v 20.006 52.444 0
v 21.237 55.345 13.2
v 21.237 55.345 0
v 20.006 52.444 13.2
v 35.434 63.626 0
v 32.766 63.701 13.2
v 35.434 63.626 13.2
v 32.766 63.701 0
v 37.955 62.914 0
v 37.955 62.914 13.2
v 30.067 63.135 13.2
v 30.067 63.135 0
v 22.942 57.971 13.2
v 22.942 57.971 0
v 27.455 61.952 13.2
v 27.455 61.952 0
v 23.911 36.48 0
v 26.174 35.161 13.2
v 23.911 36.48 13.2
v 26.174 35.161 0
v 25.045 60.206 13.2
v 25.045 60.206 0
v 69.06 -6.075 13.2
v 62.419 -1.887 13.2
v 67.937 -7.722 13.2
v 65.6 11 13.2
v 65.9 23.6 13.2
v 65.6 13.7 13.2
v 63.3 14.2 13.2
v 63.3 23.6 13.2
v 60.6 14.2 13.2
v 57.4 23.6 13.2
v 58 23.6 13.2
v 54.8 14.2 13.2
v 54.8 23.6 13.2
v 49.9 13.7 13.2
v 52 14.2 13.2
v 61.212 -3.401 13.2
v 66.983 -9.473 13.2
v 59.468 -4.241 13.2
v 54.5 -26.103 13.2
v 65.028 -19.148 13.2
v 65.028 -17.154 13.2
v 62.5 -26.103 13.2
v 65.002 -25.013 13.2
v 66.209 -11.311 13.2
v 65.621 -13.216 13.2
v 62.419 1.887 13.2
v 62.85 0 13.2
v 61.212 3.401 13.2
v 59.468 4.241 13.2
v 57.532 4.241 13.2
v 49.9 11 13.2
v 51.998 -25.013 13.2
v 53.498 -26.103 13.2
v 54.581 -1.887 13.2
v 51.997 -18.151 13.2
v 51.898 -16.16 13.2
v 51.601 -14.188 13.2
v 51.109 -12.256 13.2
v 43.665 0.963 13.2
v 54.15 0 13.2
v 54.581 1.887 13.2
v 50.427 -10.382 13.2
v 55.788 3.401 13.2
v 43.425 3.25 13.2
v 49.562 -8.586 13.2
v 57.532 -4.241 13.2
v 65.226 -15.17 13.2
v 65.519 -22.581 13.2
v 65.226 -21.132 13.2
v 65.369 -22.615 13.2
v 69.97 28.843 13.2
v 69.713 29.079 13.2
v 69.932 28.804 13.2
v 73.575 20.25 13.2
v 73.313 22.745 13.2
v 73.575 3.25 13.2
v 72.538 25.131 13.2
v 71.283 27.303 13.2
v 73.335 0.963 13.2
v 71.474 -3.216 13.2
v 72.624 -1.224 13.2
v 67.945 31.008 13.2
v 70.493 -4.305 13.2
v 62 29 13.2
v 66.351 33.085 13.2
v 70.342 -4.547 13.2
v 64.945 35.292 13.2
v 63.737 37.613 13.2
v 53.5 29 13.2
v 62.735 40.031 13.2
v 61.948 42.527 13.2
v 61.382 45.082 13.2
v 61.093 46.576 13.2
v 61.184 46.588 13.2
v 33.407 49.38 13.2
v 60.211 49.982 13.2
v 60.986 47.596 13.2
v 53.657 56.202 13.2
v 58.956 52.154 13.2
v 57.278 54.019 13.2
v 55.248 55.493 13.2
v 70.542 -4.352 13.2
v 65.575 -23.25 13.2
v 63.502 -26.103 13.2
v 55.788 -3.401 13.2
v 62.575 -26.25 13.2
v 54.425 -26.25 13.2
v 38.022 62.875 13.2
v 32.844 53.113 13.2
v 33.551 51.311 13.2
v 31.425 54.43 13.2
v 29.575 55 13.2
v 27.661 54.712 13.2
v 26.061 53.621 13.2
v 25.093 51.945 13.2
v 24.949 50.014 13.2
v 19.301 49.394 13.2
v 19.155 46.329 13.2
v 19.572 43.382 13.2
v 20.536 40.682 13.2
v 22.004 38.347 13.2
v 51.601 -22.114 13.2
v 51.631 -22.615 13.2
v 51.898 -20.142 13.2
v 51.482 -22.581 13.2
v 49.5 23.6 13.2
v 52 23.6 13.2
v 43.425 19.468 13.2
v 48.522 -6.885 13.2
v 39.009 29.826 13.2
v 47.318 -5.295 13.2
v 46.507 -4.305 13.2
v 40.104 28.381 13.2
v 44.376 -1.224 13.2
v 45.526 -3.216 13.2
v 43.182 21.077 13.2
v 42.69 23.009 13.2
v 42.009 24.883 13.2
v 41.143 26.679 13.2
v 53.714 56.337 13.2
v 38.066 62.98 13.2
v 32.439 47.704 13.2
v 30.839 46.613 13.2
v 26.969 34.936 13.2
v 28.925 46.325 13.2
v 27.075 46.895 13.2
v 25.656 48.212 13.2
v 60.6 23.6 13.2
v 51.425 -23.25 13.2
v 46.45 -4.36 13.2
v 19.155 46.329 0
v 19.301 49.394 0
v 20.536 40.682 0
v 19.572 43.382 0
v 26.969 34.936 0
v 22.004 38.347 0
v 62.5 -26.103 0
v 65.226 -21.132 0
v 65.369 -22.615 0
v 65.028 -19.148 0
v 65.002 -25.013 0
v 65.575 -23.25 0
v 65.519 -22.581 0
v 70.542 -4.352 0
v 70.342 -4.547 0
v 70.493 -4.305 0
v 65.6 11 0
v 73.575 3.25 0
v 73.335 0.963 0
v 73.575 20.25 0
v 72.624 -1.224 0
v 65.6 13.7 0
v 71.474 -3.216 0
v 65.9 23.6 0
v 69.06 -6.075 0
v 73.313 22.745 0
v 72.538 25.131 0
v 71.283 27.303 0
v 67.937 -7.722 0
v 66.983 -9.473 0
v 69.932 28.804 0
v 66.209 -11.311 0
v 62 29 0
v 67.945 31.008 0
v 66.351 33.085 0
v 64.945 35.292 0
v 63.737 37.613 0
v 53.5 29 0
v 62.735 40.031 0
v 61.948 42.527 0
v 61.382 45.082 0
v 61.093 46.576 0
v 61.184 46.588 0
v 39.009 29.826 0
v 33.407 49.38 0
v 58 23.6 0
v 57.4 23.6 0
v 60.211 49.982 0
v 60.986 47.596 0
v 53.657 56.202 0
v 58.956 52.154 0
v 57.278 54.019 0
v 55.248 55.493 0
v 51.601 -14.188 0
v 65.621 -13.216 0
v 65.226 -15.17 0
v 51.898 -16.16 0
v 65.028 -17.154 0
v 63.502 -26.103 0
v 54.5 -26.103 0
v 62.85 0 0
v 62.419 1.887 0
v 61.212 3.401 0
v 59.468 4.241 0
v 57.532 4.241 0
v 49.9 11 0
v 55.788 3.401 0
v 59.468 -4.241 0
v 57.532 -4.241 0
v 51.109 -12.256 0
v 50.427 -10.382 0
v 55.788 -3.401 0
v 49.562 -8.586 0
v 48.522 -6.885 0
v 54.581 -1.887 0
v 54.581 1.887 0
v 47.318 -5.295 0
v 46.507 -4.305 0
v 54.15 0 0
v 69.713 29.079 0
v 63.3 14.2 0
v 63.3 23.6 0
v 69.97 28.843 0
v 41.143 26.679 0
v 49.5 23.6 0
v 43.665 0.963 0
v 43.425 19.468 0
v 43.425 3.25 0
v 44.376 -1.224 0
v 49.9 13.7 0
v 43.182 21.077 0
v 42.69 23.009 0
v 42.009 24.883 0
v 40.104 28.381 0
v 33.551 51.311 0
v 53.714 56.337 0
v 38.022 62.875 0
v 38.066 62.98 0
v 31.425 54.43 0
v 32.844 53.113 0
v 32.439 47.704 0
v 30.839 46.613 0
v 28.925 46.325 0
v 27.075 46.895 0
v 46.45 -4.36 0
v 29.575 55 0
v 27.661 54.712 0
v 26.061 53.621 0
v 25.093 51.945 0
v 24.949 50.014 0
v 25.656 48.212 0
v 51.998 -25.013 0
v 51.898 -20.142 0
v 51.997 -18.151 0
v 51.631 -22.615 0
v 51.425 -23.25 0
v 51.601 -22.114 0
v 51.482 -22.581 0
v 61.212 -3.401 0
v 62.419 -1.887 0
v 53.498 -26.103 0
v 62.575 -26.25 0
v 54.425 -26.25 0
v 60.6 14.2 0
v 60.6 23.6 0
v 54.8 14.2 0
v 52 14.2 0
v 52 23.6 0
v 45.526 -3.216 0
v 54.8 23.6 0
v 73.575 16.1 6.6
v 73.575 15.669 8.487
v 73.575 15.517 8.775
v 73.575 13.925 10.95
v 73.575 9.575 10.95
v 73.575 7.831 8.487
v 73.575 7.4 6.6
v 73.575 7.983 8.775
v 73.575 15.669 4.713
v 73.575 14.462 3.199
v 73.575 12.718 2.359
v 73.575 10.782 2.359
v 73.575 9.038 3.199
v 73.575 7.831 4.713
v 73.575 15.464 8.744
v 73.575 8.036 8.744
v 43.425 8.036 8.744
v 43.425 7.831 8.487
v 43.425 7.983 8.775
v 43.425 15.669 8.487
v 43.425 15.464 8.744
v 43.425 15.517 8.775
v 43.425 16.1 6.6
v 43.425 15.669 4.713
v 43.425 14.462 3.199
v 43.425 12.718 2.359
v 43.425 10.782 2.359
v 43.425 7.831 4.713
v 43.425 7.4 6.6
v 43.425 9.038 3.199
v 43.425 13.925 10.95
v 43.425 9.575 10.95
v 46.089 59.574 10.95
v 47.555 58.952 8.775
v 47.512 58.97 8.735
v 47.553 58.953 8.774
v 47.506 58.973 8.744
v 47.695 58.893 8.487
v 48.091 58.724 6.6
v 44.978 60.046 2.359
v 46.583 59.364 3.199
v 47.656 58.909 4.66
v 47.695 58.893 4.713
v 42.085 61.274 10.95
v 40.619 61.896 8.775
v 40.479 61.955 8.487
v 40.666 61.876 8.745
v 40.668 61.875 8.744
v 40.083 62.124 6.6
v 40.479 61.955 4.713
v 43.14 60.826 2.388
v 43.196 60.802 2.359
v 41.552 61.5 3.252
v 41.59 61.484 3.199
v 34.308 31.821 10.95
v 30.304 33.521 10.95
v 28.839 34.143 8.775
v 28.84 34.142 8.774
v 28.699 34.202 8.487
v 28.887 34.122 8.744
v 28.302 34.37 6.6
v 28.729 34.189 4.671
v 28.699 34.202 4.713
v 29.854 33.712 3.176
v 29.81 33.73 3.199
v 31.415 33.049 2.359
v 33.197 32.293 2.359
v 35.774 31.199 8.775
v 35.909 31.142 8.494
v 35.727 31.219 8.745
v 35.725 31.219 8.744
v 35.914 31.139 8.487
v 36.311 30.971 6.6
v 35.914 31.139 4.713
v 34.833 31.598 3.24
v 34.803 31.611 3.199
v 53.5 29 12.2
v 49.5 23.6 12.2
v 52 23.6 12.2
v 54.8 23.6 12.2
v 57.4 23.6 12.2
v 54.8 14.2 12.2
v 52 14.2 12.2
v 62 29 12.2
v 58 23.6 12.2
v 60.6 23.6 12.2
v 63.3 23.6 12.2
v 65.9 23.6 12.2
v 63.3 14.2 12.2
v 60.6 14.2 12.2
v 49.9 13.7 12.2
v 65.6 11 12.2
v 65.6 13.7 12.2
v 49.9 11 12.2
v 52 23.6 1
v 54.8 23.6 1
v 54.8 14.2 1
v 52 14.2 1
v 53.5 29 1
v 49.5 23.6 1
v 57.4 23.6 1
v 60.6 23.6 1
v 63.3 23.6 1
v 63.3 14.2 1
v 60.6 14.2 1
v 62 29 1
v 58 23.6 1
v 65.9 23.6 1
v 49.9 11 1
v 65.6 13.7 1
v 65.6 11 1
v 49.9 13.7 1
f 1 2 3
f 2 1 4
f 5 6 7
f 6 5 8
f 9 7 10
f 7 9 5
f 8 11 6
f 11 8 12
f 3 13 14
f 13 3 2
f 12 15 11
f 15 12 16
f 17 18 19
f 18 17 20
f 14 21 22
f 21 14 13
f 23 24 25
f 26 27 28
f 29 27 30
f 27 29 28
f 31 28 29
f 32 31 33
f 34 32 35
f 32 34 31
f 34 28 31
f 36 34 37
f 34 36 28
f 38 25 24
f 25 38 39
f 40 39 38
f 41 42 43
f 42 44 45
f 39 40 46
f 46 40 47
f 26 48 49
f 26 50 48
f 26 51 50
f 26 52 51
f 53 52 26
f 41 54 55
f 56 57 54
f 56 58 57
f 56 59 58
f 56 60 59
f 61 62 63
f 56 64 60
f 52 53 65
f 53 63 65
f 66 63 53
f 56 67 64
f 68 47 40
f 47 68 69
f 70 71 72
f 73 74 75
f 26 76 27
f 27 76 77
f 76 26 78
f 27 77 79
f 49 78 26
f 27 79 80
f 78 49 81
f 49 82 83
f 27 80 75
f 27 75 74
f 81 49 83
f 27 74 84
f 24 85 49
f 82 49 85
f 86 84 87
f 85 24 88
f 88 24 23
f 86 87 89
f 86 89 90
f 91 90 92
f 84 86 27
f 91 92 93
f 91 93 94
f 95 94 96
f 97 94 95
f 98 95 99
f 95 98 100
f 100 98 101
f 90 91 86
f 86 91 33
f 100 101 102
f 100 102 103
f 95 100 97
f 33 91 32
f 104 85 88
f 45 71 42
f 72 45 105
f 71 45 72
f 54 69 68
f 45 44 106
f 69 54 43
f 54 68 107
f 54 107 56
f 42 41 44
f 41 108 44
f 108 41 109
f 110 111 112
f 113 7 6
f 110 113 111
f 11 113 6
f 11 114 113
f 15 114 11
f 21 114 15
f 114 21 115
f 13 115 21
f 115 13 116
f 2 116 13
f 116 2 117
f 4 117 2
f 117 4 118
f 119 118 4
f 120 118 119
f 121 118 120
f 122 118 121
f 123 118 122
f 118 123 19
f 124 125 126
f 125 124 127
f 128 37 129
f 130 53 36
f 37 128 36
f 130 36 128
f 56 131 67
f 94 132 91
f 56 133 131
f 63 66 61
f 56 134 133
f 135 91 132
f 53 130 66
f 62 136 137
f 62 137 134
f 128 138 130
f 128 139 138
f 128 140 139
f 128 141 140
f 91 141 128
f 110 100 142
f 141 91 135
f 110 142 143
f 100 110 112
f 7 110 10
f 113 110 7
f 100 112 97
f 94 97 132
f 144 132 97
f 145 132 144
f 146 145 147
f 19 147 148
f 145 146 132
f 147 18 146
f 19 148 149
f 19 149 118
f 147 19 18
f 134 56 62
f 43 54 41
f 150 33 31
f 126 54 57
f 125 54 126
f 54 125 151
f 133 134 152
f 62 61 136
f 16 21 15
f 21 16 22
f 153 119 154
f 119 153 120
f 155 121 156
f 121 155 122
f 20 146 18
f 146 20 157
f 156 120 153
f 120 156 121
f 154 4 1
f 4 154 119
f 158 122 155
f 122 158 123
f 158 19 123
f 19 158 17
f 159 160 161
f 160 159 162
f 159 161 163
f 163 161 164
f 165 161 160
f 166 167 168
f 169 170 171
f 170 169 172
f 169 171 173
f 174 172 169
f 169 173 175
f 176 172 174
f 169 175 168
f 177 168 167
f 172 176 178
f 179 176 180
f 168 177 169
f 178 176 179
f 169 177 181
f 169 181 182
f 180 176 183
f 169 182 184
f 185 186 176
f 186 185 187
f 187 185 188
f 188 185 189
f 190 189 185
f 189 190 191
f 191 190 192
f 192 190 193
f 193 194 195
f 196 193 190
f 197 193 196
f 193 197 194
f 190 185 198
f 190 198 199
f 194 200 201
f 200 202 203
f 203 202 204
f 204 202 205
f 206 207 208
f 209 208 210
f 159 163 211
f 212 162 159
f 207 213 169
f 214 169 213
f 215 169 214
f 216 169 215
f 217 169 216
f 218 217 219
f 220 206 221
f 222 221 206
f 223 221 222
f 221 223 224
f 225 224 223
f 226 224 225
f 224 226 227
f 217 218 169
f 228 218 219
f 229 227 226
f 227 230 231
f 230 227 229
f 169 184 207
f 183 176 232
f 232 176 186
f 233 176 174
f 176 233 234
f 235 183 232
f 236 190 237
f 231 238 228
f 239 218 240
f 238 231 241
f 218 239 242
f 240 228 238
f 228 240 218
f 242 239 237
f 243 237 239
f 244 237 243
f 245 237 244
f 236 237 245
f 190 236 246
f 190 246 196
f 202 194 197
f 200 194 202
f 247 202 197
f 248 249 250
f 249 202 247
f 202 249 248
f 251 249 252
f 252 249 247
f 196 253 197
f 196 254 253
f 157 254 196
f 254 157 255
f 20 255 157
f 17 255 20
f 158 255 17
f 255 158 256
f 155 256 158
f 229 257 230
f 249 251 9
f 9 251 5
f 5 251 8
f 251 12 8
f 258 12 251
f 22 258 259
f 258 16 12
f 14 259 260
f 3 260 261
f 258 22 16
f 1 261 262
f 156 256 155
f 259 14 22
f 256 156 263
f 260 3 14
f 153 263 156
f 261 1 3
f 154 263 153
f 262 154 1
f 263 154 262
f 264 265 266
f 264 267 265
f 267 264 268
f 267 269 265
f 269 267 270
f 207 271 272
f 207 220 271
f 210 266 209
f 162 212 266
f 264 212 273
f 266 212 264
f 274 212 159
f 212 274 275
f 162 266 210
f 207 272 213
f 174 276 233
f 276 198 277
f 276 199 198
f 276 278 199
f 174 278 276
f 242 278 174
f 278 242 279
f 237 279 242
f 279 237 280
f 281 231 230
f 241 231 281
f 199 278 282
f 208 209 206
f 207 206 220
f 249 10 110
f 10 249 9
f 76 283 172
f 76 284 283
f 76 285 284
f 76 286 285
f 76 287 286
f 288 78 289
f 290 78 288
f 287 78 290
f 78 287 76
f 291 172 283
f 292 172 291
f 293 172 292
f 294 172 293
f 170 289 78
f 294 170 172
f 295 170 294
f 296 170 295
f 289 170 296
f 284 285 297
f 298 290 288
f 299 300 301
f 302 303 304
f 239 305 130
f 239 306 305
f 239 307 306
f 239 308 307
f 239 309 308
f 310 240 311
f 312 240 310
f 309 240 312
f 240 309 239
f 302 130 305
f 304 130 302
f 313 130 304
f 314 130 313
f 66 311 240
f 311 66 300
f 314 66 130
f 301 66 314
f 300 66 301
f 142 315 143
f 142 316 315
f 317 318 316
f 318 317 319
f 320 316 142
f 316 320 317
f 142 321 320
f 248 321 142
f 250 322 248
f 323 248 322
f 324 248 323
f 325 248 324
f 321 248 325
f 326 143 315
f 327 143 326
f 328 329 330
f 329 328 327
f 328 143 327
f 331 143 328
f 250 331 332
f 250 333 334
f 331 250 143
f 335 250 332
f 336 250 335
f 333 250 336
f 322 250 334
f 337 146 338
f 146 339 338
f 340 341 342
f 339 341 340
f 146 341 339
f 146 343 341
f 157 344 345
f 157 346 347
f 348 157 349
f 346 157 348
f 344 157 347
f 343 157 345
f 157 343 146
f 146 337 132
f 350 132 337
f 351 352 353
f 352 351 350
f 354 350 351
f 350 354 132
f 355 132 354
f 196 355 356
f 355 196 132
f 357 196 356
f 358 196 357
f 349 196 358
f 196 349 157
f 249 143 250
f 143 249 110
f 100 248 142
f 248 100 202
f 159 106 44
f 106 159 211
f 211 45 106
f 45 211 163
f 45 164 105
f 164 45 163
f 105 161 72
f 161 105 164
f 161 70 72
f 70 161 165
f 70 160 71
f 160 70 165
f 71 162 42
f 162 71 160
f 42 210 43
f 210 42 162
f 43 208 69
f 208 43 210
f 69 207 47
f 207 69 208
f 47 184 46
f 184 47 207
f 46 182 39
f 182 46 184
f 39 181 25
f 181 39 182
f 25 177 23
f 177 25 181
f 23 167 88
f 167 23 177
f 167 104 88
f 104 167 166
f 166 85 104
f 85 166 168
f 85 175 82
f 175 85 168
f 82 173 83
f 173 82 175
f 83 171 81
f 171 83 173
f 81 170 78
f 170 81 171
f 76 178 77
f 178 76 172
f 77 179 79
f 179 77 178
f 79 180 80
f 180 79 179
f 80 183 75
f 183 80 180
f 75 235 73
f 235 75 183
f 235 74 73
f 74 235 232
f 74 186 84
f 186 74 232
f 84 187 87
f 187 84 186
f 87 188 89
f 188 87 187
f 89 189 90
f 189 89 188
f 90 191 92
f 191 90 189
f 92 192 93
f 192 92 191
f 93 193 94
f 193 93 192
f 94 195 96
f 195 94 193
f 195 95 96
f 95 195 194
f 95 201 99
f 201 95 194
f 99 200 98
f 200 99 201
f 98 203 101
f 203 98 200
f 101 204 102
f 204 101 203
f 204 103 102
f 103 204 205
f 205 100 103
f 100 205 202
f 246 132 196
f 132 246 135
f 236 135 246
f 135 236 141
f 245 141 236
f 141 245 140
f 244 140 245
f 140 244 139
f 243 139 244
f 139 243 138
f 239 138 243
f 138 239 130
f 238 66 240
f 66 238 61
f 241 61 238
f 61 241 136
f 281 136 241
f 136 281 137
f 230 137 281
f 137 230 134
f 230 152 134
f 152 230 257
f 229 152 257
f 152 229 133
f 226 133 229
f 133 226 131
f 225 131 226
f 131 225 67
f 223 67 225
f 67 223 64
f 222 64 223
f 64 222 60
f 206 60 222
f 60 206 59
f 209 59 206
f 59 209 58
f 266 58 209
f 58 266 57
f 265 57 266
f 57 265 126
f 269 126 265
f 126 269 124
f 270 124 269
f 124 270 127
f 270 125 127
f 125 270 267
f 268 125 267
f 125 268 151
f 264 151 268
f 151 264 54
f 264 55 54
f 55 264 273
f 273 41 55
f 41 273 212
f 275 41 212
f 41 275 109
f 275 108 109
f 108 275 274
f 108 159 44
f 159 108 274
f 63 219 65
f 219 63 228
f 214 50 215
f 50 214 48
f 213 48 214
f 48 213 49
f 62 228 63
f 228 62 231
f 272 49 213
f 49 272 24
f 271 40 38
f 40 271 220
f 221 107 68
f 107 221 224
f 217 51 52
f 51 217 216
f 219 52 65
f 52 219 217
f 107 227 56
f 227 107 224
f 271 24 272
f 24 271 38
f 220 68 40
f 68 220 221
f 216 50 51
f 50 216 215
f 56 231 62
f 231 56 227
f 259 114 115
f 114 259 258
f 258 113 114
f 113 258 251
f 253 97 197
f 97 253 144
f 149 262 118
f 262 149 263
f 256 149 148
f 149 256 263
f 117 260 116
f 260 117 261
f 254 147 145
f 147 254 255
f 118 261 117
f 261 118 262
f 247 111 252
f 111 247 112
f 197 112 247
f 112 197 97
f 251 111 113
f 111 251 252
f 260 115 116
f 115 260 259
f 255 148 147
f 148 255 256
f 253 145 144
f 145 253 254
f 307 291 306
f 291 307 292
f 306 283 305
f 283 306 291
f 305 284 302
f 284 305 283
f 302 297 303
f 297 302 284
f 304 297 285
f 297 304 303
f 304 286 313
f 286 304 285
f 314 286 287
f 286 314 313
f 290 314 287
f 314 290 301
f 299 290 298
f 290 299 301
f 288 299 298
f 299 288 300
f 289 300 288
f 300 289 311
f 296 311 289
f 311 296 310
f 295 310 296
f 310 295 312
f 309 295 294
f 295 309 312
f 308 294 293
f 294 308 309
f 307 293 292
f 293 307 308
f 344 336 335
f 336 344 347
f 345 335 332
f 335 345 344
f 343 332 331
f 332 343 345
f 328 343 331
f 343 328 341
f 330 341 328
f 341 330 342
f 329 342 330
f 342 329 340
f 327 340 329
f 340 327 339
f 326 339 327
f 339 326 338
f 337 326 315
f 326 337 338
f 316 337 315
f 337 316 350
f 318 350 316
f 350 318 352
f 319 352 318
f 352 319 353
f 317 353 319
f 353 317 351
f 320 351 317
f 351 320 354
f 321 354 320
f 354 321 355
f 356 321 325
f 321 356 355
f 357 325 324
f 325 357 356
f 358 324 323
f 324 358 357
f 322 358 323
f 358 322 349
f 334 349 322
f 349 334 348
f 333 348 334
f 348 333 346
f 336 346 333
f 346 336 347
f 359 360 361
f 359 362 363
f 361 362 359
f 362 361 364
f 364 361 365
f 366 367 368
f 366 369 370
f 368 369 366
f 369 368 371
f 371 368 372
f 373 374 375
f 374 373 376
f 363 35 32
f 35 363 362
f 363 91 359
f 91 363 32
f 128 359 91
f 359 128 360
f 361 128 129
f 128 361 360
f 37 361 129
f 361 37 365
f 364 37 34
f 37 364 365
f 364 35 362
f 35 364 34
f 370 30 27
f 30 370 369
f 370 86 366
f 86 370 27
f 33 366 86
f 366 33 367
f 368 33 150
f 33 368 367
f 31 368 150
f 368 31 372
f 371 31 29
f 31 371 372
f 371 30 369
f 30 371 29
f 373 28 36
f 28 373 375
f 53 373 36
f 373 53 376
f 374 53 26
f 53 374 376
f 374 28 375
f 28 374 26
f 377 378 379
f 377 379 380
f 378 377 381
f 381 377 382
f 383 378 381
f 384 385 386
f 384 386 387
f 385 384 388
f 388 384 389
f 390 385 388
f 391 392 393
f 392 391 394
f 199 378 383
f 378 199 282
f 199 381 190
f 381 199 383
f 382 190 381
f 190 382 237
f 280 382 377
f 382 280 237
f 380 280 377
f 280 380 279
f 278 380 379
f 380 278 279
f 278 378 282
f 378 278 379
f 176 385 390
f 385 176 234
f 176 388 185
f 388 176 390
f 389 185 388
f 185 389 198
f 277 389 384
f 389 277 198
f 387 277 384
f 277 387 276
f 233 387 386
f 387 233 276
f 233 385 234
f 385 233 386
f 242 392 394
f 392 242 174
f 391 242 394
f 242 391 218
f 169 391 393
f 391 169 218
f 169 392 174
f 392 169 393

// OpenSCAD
// file: functions.scad
// PRUSA Mendel  
// Functions used in many files
// GNU GPL v3
// Josef Průša
// josefprusa@me.com
// prusadjs.cz
// http://www.reprap.org/wiki/Prusa_Mendel
// http://github.com/prusajr/PrusaMendel


module nut(d,h,horizontal=true){
cornerdiameter =  (d / 2) / cos (180 / 6);
cylinder(h = h, r = cornerdiameter, $fn = 6);
if(horizontal){
for(i = [1:6]){
	rotate([0,0,60*i]) translate([-cornerdiameter-0.2,0,0]) rotate([0,0,-45]) cube(size = [2,2,h]);
}}
}

// Based on nophead research
module polyhole(d,h) {
    n = max(round(2 * d),3);
    rotate([0,0,180])
        cylinder(h = h, r = (d / 2) / cos (180 / n), $fn = n);
}




module roundcorner(diameter){
	difference(){
		cube(size = [diameter,diameter,99], center = false);
		translate(v = [diameter, diameter, 0]) cylinder(h = 100, r=diameter, center=true);
	}
}
// file: metric.scad
// PRUSA Mendel  
// Default metric sizes
// GNU GPL v3
// Josef Průša
// josefprusa@me.com
// prusadjs.cz
// http://www.reprap.org/wiki/Prusa_Mendel
// http://github.com/prusajr/PrusaMendel

// DONT CHANGE THIS FILE! ALTER VALUES IN CONFIGURATION.SCAD INSTEAD

// RODS

threaded_rod_diameter = 8.7;
threaded_rod_diameter_horizontal = 8.7;
smooth_bar_diameter = 8;
smooth_bar_diameter_horizontal = 8.5;

// Nuts and bolts

m8_diameter = 9;
m8_nut_diameter = 14.1;

m4_diameter = 4.5;
m4_nut_diameter = 9;

m3_diameter = 3.6;
m3_nut_diameter = 5.3;
m3_nut_diameter_horizontal = 6.1;

// Bushing holder

bushing_core_diameter = smooth_bar_diameter;
bushing_material_thickness = 1;

// Motors

motor_shaft = 5.5;
// file: configuration.scad
// PRUSA Mendel  
// Configuration file
// GNU GPL v3
// Josef Průša
// josefprusa@me.com
// prusadjs.cz
// http://www.reprap.org/wiki/Prusa_Mendel
// http://github.com/prusajr/PrusaMendel

// PLEASE SELECT ONE OF THE CONFIGURATIONS BELOW
// BY UN-COMMENTING IT

// Uncomment for metric settings
// METRIC METRIC METRIC METRIC METRIC METRIC METRIC METRIC 

include <metric.scad>;

// CUSTOM CUSTOM CUSTOM CUSTOM CUSTOM CUSTOM CUSTOM CUSTOM CUSTOM

thin_wall = 3;


// Linear bearing version
linear = false;
// set false for LM-8UU, true for LM-E-8UU (ignore if linear is set to false)
lme8uu = false;



// CHANGE ONLY THE STUFF YOU KNOW
// IT WILL REPLACE DEFAULT SETTING

// RODS

// threaded_rod_diameter = 0;
// threaded_rod_diameter_horizontal = 0;
// smooth_bar_diameter = 0;
// smooth_bar_diameter_horizontal = 0;

// Nuts and bolts

// m8_diameter = 0;
// m8_nut_diameter = 0;

// m4_diameter = 0;
// m4_nut_diameter = 0;

// m3_diameter = 0;
// m3_nut_diameter = 0;

// Bushing holder

// bushing_core_diameter = smooth_bar_diameter;
// bushing_material_thickness = 0;


///counted stuff
m3_nut_diameter_bigger = ((m3_nut_diameter  / 2) / cos (180 / 6))*2;

// functions 
include <functions.scad>
// main file
// Thanks for awesome Greg Frosts curves :-)

// PRUSA Mendel  
// Frame vertex
// GNU GPL v3
// Greg Frost
// http://www.reprap.org/wiki/Prusa_Mendel
// http://github.com/prusajr/PrusaMendel


include <configuration.scad>

vertex_bottom();

//%import_stl("frame-vertex.stl");

//teardrop();

module teardrop (r=8,h=20)
{
	rotate([-270,0,90])
	linear_extrude(height=h)
	{
		circle(r=r);
		polygon(points=[[0,0],[r*cos(30),r*sin(30)],[0.5*r,r],[-0.5*r,r],[-r*cos(30),r*sin(30)]],
				paths=[[0,1,2,3,4]]);
	}
}



vfvertex_height=threaded_rod_diameter+4.5;

/**
 * @id frame-vertex
 * @name Frame vertex
 * @category Printed
 * @id frame-vertex
 * @using 8 m8nut
 * @using 8 m8washer
 */
/**
 * @id frame-vertex-foot
 * @name Frame vertex with foot
 * @category Printed
 * @id frame-vertex-foot
 * @using 8 m8nut
 * @using 8 m8washer
 */

hole_separation=58.5;  // distance between the holes in x dir
vertex_end_major_d=30.15;  // diameter at the triangle holes
vertex_end_minor_d=18.5;  // the width of the ovale at the top x dir hole
vertex_horizontal_hole_offset=11.75; // distance between the x dir holes and the triangle holes
hole_flat_radius=8.5; // flat surface around holes.
foot_depth=26.25; // length of the foot
end_round_translation=vertex_horizontal_hole_offset-hole_flat_radius;

base_angle = 67; // angle at the base of the triangle  


module vertex_bottom()
{
	peg_offset = [	(cos(base_angle-60)*vertex_end_major_d/2 - sin(base_angle-60)*-hole_flat_radius)-vertex_end_major_d/2,
					(sin(base_angle-60)*vertex_end_major_d/2 + cos(base_angle-60)*-hole_flat_radius)--hole_flat_radius];

	peg_r=12;
	peg1=[hole_separation+vertex_end_major_d/2-peg_r,
		vertex_horizontal_hole_offset+hole_flat_radius];
	peg2=rotate_vec([hole_separation+vertex_end_major_d/2-peg_r,
		-vertex_horizontal_hole_offset-hole_flat_radius],60);

	inner_peg_r=12;
	peg3=[hole_separation-vertex_end_major_d/2+inner_peg_r,
		vertex_horizontal_hole_offset+hole_flat_radius];
	peg4=rotate_vec([hole_separation-vertex_end_major_d/2+inner_peg_r,
		-vertex_horizontal_hole_offset-hole_flat_radius],60);

	a1_r=11;
	a2_r=11;
	a3_r=3;
	a4_r=3;

	a1=[hole_separation-vertex_end_major_d/2+a1_r,
		vertex_horizontal_hole_offset-hole_flat_radius];
	a2=[hole_separation+vertex_end_major_d/2-a2_r,
		vertex_horizontal_hole_offset-hole_flat_radius];
	a3=[hole_separation-vertex_end_major_d/2+a1_r,-foot_depth+a3_r];
	a4=[hole_separation+vertex_end_major_d/2-a2_r,-foot_depth+a4_r];

	edge_offset = abs( vertex_end_major_d/2 - (cos(base_angle-60)*vertex_end_major_d/2 - sin(base_angle-60)*hole_flat_radius)); // x dir offset of the rotated box
//	translate([-hole_separation-vertex_end_major_d/2,-vertex_horizontal_hole_offset,-vfvertex_height/2])
//	translate([-18.5,9,0])
	difference ()
	{
		union ()
		{
			// top end ovall
			rotate(60)
			translate([hole_separation,end_round_translation-2*end_round_translation,0])
			  rotate(base_angle - 60) 
			scale([1,(vertex_end_minor_d+2*end_round_translation)/vertex_end_major_d,1])
				cylinder(r=vertex_end_major_d/2,h=vfvertex_height); 

			// block for bootom holes in y dir
			translate(	[hole_separation,
						vertex_horizontal_hole_offset, 
						vfvertex_height/2])
				cube([vertex_end_major_d, 2*hole_flat_radius,vfvertex_height],center=true);

			// blocks for the triangle screews	
			rotate(60)
			translate(	[hole_separation,
						vertex_horizontal_hole_offset-1*2*vertex_horizontal_hole_offset, 
						vfvertex_height/2])
			translate([edge_offset , 0, 0])  rotate(base_angle - 60) 
				cube([vertex_end_major_d, 2*hole_flat_radius,vfvertex_height],center=true);

			// midpard and foot
			linear_extrude(height=vfvertex_height)
			{
				// The outer curve.
				barbell(peg1,peg2+peg_offset,peg_r,peg_r,200,30);
				// The inner curve.
				barbell(peg3,peg4+peg_offset,inner_peg_r,inner_peg_r,20,200);

				// Curves for the feet
				barbell(a1,a3,a1_r,a3_r,200,20);
				barbell(a2,a4,a2_r,a4_r,20,200);

				// The flat bit on the bottom of the foot.
				polygon(points=[a3+[0,-a3_r],a4+[0,-a4_r],(a3+a4)/2+[0,5]],
					paths=[[0,1,2]]);
				
			}
		}

		//x dir holes
		for (hole=[0:1])
		rotate(hole*60)
		translate([hole_separation,0,-1])
			cylinder(h=vfvertex_height+2,r=(threaded_rod_diameter/2)); 

		
		// riangle bootom hole
		translate(	[hole_separation-vertex_end_major_d/2-1,
					vertex_horizontal_hole_offset,
					vfvertex_height/2])
			teardrop(r=threaded_rod_diameter/2,h=vertex_end_major_d+2);

		//triangle top holes
		rotate(60)
		translate(	[hole_separation-vertex_end_major_d/2-1,
					vertex_horizontal_hole_offset-2*1*vertex_horizontal_hole_offset,
					vfvertex_height/2]) 
		translate([edge_offset , 0, 0])  rotate(base_angle - 60) 
			teardrop(r=threaded_rod_diameter/2,h=vertex_end_major_d+2);
		
		//this way up
		translate([31+18.5,20-9,vfvertex_height]) linear_extrude(file = "this-way-up.dxf", layer = "0",
  height = 2, center = true, convexity = 10, twist = 0);
		translate([31+18.5,20-9,0]) linear_extrude(file = "this-way-up.dxf", layer = "0",
  height = 2, center = true, convexity = 10, twist = 0);
	}
}

module barbell (x1,x2,r1,r2,r3,r4) 
{
	x3=triangulate (x1,x2,r1+r3,r2+r3);
	x4=triangulate (x2,x1,r2+r4,r1+r4);
	render()  
	difference ()
	{
		union()
		{
			translate(x1)
			circle (r=r1);
			translate(x2)
			circle(r=r2);
			polygon (points=[x1,x3,x2,x4]);
		}
		translate(x3)
		circle(r=r3,$fa=5);
		translate(x4)
		circle(r=r4,$fa=5);
	}
}

function triangulate (point1, point2, length1, length2) = 
point1 + 
length1*rotated(
atan2(point2[1]-point1[1],point2[0]-point1[0])+
angle(distance(point1,point2),length1,length2));

function distance(point1,point2)=
sqrt((point1[0]-point2[0])*(point1[0]-point2[0])+
(point1[1]-point2[1])*(point1[1]-point2[1]));

function angle(a,b,c) = acos((a*a+b*b-c*c)/(2*a*b)); 

function rotated(a)=[cos(a),sin(a),0];
function rotate_vec(v,a)=[cos(a)*v[0]-sin(a)*v[1],sin(a)*v[0]+cos(a)*v[1]];
